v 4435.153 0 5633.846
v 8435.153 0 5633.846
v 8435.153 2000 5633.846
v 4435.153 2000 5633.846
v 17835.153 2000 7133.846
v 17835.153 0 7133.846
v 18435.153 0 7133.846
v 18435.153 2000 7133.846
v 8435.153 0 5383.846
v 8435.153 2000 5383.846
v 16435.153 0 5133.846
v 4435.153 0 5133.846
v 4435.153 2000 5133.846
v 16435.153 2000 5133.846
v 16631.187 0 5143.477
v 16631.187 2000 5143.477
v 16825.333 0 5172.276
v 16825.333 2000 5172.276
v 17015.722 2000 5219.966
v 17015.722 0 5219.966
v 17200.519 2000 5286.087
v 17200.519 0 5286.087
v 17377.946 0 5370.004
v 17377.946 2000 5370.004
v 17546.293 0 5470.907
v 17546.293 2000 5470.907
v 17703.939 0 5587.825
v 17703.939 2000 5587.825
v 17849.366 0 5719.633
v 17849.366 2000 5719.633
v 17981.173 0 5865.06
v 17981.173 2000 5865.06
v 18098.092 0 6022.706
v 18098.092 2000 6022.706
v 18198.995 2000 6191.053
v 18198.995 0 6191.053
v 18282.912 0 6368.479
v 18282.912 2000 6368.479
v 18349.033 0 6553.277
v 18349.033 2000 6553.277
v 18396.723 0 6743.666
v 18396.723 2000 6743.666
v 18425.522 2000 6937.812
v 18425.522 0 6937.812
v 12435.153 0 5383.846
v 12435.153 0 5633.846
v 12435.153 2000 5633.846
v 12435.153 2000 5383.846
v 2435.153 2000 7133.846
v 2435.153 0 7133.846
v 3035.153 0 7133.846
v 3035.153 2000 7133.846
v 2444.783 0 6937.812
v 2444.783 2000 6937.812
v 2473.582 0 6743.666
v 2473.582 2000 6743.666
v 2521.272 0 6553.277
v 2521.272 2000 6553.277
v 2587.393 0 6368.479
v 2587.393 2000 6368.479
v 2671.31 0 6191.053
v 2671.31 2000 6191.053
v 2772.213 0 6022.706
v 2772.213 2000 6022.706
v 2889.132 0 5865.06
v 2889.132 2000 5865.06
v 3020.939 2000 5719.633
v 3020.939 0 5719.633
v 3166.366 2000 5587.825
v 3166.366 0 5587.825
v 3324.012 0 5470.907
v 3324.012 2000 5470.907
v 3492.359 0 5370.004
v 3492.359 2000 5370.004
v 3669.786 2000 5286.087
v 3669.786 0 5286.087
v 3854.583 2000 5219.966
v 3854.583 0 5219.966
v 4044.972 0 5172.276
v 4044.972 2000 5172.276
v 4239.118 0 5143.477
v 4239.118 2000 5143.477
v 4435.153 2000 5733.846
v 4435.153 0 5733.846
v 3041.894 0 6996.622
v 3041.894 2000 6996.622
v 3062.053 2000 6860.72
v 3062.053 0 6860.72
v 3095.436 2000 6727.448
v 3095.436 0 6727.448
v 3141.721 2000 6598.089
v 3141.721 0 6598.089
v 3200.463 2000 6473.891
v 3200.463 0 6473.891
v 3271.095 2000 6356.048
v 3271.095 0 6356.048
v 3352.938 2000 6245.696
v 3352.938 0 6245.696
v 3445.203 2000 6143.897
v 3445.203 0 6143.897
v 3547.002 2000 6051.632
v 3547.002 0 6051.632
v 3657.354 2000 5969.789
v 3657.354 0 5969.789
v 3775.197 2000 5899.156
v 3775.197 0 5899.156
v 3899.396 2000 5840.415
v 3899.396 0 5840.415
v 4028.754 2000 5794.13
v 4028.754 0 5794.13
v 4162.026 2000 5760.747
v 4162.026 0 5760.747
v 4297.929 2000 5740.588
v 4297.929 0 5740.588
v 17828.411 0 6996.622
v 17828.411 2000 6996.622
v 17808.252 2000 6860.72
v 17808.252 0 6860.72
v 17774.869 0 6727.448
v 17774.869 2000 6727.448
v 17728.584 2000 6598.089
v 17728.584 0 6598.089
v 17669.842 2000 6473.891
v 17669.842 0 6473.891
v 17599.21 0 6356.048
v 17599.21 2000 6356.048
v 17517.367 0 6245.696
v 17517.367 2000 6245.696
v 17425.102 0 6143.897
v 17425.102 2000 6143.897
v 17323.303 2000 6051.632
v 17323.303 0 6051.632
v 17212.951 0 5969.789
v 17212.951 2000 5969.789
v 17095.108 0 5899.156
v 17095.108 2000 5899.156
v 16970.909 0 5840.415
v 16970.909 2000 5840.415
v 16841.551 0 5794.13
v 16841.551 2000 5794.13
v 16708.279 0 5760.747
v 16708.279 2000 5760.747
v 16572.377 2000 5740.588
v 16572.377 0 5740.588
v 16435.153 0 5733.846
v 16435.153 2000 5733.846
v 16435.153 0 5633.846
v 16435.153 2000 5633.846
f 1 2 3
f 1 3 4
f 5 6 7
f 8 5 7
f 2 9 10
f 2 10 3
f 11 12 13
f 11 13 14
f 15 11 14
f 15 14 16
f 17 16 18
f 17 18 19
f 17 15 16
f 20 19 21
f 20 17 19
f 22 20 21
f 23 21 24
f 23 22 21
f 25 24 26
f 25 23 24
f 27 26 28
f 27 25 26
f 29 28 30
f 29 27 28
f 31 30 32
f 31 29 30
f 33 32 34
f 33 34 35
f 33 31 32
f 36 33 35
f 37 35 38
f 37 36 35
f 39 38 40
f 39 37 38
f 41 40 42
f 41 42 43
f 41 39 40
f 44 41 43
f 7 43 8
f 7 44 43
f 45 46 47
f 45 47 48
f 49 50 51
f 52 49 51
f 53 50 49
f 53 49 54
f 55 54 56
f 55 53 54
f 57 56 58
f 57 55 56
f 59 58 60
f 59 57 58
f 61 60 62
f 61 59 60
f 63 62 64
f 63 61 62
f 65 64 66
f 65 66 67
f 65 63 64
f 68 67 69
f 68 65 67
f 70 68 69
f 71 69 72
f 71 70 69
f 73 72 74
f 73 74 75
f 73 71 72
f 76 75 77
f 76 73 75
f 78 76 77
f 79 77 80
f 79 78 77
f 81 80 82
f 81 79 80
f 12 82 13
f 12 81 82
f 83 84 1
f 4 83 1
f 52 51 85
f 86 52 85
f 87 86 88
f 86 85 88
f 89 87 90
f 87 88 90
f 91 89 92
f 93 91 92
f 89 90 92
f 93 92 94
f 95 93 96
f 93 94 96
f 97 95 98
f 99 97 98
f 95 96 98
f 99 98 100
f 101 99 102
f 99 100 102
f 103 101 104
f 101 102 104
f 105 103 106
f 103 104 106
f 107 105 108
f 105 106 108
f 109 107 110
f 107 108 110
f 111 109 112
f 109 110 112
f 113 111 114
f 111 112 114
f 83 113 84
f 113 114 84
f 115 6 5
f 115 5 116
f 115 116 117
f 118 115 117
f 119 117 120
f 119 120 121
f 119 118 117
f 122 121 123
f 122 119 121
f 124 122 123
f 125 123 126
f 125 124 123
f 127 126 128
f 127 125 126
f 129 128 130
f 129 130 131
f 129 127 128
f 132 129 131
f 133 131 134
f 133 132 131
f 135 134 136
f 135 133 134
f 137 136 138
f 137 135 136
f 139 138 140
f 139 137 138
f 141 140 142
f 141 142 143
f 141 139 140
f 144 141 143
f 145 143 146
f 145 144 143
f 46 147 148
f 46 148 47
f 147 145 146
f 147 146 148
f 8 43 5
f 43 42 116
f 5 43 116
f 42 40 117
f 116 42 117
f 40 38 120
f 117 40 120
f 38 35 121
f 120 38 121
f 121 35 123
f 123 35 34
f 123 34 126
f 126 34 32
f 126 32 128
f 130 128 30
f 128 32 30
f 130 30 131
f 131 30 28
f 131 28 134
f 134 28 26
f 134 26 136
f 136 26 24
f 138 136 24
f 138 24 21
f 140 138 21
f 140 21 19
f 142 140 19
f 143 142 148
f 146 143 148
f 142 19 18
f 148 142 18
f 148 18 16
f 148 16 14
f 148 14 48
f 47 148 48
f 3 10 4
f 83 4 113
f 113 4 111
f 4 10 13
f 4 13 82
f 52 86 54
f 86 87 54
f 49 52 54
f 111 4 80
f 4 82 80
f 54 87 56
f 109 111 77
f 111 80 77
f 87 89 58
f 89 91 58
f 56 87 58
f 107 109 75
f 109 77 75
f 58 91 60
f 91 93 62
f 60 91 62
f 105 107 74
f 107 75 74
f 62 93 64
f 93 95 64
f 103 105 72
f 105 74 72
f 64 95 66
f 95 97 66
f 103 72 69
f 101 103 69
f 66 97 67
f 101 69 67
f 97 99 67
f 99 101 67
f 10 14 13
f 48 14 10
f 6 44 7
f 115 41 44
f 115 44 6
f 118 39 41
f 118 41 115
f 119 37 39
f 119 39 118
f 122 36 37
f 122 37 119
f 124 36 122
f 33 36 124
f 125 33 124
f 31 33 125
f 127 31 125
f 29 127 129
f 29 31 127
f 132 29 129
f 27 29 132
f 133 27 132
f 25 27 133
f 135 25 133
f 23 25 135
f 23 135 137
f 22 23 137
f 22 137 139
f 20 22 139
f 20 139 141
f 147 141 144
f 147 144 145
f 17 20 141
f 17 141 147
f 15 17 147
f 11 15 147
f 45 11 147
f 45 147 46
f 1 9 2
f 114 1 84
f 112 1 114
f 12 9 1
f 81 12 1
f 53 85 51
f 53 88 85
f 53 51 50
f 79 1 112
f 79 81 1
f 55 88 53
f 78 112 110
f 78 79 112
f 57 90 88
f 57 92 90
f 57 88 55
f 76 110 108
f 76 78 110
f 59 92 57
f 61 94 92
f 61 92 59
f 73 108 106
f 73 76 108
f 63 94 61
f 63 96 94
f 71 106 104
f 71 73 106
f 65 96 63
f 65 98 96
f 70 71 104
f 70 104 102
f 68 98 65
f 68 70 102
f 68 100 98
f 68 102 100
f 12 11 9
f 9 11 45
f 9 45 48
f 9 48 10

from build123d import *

# Parameters (mm, degrees)
BOSS_EXTRUDE3_DEPTH = 2000


with BuildPart() as part:
    # Sketch1 → Boss-Extrude3 (new body)
    with BuildSketch(Plane(origin=(0, 0, 0), x_dir=(1, 0, 0), z_dir=(0, 1, 0))):
        with BuildLine():
            Line((4435.152503865, -5133.846248201), (16435.152503865, -5133.846248201))
            ThreePointArc((16435.152503865, -5133.846248201), (17849.366066238, -5719.632685828), (18435.152503865, -7133.846248201))
            Line((18435.152503865, -7133.846248201), (17935.152503865, -7133.846248201))
            ThreePointArc((17935.152503865, -7133.846248201), (17495.812675645, -6073.186076421), (16435.152503865, -5633.846248201))
            Line((16435.152503865, -5633.846248201), (12435.152503865, -5633.846248201))
            Line((12435.152503865, -5633.846248201), (12435.152503865, -5383.846248201))
            Line((12435.152503865, -5383.846248201), (10435.152503865, -5383.846248201))
            Line((10435.152503865, -5383.846248201), (8435.152503865, -5383.846248201))
            Line((8435.152503865, -5383.846248201), (8435.152503865, -5633.846248201))
            Line((8435.152503865, -5633.846248201), (4435.152503865, -5633.846248201))
            ThreePointArc((4435.152503865, -5633.846248201), (3374.492332085, -6073.186076421), (2935.152503865, -7133.846248201))
            Line((2935.152503865, -7133.846248201), (2435.152503865, -7133.846248201))
            ThreePointArc((2435.152503865, -7133.846248201), (3020.938941492, -5719.632685828), (4435.152503865, -5133.846248201))
        make_face()
        with BuildLine():
            Line((4435.152503865, -5733.846248201), (4435.152503865, -5633.846248201))
            ThreePointArc((4435.152503865, -5633.846248201), (3374.492332085, -6073.186076421), (2935.152503865, -7133.846248201))
            Line((2935.152503865, -7133.846248201), (3035.152503865, -7133.846248201))
            ThreePointArc((3035.152503865, -7133.846248201), (3445.203010204, -6143.89675454), (4435.152503865, -5733.846248201))
        make_face()
        with BuildLine():
            ThreePointArc((16435.152503865, -5633.846248201), (17495.812675645, -6073.186076421), (17935.152503865, -7133.846248201))
            Line((17935.152503865, -7133.846248201), (17835.152503865, -7133.846248201))
            ThreePointArc((17835.152503865, -7133.846248201), (17425.101997526, -6143.89675454), (16435.152503865, -5733.846248201))
            Line((16435.152503865, -5733.846248201), (16435.152503865, -5633.846248201))
        make_face()
    extrude(amount=BOSS_EXTRUDE3_DEPTH)


solid = part.part
